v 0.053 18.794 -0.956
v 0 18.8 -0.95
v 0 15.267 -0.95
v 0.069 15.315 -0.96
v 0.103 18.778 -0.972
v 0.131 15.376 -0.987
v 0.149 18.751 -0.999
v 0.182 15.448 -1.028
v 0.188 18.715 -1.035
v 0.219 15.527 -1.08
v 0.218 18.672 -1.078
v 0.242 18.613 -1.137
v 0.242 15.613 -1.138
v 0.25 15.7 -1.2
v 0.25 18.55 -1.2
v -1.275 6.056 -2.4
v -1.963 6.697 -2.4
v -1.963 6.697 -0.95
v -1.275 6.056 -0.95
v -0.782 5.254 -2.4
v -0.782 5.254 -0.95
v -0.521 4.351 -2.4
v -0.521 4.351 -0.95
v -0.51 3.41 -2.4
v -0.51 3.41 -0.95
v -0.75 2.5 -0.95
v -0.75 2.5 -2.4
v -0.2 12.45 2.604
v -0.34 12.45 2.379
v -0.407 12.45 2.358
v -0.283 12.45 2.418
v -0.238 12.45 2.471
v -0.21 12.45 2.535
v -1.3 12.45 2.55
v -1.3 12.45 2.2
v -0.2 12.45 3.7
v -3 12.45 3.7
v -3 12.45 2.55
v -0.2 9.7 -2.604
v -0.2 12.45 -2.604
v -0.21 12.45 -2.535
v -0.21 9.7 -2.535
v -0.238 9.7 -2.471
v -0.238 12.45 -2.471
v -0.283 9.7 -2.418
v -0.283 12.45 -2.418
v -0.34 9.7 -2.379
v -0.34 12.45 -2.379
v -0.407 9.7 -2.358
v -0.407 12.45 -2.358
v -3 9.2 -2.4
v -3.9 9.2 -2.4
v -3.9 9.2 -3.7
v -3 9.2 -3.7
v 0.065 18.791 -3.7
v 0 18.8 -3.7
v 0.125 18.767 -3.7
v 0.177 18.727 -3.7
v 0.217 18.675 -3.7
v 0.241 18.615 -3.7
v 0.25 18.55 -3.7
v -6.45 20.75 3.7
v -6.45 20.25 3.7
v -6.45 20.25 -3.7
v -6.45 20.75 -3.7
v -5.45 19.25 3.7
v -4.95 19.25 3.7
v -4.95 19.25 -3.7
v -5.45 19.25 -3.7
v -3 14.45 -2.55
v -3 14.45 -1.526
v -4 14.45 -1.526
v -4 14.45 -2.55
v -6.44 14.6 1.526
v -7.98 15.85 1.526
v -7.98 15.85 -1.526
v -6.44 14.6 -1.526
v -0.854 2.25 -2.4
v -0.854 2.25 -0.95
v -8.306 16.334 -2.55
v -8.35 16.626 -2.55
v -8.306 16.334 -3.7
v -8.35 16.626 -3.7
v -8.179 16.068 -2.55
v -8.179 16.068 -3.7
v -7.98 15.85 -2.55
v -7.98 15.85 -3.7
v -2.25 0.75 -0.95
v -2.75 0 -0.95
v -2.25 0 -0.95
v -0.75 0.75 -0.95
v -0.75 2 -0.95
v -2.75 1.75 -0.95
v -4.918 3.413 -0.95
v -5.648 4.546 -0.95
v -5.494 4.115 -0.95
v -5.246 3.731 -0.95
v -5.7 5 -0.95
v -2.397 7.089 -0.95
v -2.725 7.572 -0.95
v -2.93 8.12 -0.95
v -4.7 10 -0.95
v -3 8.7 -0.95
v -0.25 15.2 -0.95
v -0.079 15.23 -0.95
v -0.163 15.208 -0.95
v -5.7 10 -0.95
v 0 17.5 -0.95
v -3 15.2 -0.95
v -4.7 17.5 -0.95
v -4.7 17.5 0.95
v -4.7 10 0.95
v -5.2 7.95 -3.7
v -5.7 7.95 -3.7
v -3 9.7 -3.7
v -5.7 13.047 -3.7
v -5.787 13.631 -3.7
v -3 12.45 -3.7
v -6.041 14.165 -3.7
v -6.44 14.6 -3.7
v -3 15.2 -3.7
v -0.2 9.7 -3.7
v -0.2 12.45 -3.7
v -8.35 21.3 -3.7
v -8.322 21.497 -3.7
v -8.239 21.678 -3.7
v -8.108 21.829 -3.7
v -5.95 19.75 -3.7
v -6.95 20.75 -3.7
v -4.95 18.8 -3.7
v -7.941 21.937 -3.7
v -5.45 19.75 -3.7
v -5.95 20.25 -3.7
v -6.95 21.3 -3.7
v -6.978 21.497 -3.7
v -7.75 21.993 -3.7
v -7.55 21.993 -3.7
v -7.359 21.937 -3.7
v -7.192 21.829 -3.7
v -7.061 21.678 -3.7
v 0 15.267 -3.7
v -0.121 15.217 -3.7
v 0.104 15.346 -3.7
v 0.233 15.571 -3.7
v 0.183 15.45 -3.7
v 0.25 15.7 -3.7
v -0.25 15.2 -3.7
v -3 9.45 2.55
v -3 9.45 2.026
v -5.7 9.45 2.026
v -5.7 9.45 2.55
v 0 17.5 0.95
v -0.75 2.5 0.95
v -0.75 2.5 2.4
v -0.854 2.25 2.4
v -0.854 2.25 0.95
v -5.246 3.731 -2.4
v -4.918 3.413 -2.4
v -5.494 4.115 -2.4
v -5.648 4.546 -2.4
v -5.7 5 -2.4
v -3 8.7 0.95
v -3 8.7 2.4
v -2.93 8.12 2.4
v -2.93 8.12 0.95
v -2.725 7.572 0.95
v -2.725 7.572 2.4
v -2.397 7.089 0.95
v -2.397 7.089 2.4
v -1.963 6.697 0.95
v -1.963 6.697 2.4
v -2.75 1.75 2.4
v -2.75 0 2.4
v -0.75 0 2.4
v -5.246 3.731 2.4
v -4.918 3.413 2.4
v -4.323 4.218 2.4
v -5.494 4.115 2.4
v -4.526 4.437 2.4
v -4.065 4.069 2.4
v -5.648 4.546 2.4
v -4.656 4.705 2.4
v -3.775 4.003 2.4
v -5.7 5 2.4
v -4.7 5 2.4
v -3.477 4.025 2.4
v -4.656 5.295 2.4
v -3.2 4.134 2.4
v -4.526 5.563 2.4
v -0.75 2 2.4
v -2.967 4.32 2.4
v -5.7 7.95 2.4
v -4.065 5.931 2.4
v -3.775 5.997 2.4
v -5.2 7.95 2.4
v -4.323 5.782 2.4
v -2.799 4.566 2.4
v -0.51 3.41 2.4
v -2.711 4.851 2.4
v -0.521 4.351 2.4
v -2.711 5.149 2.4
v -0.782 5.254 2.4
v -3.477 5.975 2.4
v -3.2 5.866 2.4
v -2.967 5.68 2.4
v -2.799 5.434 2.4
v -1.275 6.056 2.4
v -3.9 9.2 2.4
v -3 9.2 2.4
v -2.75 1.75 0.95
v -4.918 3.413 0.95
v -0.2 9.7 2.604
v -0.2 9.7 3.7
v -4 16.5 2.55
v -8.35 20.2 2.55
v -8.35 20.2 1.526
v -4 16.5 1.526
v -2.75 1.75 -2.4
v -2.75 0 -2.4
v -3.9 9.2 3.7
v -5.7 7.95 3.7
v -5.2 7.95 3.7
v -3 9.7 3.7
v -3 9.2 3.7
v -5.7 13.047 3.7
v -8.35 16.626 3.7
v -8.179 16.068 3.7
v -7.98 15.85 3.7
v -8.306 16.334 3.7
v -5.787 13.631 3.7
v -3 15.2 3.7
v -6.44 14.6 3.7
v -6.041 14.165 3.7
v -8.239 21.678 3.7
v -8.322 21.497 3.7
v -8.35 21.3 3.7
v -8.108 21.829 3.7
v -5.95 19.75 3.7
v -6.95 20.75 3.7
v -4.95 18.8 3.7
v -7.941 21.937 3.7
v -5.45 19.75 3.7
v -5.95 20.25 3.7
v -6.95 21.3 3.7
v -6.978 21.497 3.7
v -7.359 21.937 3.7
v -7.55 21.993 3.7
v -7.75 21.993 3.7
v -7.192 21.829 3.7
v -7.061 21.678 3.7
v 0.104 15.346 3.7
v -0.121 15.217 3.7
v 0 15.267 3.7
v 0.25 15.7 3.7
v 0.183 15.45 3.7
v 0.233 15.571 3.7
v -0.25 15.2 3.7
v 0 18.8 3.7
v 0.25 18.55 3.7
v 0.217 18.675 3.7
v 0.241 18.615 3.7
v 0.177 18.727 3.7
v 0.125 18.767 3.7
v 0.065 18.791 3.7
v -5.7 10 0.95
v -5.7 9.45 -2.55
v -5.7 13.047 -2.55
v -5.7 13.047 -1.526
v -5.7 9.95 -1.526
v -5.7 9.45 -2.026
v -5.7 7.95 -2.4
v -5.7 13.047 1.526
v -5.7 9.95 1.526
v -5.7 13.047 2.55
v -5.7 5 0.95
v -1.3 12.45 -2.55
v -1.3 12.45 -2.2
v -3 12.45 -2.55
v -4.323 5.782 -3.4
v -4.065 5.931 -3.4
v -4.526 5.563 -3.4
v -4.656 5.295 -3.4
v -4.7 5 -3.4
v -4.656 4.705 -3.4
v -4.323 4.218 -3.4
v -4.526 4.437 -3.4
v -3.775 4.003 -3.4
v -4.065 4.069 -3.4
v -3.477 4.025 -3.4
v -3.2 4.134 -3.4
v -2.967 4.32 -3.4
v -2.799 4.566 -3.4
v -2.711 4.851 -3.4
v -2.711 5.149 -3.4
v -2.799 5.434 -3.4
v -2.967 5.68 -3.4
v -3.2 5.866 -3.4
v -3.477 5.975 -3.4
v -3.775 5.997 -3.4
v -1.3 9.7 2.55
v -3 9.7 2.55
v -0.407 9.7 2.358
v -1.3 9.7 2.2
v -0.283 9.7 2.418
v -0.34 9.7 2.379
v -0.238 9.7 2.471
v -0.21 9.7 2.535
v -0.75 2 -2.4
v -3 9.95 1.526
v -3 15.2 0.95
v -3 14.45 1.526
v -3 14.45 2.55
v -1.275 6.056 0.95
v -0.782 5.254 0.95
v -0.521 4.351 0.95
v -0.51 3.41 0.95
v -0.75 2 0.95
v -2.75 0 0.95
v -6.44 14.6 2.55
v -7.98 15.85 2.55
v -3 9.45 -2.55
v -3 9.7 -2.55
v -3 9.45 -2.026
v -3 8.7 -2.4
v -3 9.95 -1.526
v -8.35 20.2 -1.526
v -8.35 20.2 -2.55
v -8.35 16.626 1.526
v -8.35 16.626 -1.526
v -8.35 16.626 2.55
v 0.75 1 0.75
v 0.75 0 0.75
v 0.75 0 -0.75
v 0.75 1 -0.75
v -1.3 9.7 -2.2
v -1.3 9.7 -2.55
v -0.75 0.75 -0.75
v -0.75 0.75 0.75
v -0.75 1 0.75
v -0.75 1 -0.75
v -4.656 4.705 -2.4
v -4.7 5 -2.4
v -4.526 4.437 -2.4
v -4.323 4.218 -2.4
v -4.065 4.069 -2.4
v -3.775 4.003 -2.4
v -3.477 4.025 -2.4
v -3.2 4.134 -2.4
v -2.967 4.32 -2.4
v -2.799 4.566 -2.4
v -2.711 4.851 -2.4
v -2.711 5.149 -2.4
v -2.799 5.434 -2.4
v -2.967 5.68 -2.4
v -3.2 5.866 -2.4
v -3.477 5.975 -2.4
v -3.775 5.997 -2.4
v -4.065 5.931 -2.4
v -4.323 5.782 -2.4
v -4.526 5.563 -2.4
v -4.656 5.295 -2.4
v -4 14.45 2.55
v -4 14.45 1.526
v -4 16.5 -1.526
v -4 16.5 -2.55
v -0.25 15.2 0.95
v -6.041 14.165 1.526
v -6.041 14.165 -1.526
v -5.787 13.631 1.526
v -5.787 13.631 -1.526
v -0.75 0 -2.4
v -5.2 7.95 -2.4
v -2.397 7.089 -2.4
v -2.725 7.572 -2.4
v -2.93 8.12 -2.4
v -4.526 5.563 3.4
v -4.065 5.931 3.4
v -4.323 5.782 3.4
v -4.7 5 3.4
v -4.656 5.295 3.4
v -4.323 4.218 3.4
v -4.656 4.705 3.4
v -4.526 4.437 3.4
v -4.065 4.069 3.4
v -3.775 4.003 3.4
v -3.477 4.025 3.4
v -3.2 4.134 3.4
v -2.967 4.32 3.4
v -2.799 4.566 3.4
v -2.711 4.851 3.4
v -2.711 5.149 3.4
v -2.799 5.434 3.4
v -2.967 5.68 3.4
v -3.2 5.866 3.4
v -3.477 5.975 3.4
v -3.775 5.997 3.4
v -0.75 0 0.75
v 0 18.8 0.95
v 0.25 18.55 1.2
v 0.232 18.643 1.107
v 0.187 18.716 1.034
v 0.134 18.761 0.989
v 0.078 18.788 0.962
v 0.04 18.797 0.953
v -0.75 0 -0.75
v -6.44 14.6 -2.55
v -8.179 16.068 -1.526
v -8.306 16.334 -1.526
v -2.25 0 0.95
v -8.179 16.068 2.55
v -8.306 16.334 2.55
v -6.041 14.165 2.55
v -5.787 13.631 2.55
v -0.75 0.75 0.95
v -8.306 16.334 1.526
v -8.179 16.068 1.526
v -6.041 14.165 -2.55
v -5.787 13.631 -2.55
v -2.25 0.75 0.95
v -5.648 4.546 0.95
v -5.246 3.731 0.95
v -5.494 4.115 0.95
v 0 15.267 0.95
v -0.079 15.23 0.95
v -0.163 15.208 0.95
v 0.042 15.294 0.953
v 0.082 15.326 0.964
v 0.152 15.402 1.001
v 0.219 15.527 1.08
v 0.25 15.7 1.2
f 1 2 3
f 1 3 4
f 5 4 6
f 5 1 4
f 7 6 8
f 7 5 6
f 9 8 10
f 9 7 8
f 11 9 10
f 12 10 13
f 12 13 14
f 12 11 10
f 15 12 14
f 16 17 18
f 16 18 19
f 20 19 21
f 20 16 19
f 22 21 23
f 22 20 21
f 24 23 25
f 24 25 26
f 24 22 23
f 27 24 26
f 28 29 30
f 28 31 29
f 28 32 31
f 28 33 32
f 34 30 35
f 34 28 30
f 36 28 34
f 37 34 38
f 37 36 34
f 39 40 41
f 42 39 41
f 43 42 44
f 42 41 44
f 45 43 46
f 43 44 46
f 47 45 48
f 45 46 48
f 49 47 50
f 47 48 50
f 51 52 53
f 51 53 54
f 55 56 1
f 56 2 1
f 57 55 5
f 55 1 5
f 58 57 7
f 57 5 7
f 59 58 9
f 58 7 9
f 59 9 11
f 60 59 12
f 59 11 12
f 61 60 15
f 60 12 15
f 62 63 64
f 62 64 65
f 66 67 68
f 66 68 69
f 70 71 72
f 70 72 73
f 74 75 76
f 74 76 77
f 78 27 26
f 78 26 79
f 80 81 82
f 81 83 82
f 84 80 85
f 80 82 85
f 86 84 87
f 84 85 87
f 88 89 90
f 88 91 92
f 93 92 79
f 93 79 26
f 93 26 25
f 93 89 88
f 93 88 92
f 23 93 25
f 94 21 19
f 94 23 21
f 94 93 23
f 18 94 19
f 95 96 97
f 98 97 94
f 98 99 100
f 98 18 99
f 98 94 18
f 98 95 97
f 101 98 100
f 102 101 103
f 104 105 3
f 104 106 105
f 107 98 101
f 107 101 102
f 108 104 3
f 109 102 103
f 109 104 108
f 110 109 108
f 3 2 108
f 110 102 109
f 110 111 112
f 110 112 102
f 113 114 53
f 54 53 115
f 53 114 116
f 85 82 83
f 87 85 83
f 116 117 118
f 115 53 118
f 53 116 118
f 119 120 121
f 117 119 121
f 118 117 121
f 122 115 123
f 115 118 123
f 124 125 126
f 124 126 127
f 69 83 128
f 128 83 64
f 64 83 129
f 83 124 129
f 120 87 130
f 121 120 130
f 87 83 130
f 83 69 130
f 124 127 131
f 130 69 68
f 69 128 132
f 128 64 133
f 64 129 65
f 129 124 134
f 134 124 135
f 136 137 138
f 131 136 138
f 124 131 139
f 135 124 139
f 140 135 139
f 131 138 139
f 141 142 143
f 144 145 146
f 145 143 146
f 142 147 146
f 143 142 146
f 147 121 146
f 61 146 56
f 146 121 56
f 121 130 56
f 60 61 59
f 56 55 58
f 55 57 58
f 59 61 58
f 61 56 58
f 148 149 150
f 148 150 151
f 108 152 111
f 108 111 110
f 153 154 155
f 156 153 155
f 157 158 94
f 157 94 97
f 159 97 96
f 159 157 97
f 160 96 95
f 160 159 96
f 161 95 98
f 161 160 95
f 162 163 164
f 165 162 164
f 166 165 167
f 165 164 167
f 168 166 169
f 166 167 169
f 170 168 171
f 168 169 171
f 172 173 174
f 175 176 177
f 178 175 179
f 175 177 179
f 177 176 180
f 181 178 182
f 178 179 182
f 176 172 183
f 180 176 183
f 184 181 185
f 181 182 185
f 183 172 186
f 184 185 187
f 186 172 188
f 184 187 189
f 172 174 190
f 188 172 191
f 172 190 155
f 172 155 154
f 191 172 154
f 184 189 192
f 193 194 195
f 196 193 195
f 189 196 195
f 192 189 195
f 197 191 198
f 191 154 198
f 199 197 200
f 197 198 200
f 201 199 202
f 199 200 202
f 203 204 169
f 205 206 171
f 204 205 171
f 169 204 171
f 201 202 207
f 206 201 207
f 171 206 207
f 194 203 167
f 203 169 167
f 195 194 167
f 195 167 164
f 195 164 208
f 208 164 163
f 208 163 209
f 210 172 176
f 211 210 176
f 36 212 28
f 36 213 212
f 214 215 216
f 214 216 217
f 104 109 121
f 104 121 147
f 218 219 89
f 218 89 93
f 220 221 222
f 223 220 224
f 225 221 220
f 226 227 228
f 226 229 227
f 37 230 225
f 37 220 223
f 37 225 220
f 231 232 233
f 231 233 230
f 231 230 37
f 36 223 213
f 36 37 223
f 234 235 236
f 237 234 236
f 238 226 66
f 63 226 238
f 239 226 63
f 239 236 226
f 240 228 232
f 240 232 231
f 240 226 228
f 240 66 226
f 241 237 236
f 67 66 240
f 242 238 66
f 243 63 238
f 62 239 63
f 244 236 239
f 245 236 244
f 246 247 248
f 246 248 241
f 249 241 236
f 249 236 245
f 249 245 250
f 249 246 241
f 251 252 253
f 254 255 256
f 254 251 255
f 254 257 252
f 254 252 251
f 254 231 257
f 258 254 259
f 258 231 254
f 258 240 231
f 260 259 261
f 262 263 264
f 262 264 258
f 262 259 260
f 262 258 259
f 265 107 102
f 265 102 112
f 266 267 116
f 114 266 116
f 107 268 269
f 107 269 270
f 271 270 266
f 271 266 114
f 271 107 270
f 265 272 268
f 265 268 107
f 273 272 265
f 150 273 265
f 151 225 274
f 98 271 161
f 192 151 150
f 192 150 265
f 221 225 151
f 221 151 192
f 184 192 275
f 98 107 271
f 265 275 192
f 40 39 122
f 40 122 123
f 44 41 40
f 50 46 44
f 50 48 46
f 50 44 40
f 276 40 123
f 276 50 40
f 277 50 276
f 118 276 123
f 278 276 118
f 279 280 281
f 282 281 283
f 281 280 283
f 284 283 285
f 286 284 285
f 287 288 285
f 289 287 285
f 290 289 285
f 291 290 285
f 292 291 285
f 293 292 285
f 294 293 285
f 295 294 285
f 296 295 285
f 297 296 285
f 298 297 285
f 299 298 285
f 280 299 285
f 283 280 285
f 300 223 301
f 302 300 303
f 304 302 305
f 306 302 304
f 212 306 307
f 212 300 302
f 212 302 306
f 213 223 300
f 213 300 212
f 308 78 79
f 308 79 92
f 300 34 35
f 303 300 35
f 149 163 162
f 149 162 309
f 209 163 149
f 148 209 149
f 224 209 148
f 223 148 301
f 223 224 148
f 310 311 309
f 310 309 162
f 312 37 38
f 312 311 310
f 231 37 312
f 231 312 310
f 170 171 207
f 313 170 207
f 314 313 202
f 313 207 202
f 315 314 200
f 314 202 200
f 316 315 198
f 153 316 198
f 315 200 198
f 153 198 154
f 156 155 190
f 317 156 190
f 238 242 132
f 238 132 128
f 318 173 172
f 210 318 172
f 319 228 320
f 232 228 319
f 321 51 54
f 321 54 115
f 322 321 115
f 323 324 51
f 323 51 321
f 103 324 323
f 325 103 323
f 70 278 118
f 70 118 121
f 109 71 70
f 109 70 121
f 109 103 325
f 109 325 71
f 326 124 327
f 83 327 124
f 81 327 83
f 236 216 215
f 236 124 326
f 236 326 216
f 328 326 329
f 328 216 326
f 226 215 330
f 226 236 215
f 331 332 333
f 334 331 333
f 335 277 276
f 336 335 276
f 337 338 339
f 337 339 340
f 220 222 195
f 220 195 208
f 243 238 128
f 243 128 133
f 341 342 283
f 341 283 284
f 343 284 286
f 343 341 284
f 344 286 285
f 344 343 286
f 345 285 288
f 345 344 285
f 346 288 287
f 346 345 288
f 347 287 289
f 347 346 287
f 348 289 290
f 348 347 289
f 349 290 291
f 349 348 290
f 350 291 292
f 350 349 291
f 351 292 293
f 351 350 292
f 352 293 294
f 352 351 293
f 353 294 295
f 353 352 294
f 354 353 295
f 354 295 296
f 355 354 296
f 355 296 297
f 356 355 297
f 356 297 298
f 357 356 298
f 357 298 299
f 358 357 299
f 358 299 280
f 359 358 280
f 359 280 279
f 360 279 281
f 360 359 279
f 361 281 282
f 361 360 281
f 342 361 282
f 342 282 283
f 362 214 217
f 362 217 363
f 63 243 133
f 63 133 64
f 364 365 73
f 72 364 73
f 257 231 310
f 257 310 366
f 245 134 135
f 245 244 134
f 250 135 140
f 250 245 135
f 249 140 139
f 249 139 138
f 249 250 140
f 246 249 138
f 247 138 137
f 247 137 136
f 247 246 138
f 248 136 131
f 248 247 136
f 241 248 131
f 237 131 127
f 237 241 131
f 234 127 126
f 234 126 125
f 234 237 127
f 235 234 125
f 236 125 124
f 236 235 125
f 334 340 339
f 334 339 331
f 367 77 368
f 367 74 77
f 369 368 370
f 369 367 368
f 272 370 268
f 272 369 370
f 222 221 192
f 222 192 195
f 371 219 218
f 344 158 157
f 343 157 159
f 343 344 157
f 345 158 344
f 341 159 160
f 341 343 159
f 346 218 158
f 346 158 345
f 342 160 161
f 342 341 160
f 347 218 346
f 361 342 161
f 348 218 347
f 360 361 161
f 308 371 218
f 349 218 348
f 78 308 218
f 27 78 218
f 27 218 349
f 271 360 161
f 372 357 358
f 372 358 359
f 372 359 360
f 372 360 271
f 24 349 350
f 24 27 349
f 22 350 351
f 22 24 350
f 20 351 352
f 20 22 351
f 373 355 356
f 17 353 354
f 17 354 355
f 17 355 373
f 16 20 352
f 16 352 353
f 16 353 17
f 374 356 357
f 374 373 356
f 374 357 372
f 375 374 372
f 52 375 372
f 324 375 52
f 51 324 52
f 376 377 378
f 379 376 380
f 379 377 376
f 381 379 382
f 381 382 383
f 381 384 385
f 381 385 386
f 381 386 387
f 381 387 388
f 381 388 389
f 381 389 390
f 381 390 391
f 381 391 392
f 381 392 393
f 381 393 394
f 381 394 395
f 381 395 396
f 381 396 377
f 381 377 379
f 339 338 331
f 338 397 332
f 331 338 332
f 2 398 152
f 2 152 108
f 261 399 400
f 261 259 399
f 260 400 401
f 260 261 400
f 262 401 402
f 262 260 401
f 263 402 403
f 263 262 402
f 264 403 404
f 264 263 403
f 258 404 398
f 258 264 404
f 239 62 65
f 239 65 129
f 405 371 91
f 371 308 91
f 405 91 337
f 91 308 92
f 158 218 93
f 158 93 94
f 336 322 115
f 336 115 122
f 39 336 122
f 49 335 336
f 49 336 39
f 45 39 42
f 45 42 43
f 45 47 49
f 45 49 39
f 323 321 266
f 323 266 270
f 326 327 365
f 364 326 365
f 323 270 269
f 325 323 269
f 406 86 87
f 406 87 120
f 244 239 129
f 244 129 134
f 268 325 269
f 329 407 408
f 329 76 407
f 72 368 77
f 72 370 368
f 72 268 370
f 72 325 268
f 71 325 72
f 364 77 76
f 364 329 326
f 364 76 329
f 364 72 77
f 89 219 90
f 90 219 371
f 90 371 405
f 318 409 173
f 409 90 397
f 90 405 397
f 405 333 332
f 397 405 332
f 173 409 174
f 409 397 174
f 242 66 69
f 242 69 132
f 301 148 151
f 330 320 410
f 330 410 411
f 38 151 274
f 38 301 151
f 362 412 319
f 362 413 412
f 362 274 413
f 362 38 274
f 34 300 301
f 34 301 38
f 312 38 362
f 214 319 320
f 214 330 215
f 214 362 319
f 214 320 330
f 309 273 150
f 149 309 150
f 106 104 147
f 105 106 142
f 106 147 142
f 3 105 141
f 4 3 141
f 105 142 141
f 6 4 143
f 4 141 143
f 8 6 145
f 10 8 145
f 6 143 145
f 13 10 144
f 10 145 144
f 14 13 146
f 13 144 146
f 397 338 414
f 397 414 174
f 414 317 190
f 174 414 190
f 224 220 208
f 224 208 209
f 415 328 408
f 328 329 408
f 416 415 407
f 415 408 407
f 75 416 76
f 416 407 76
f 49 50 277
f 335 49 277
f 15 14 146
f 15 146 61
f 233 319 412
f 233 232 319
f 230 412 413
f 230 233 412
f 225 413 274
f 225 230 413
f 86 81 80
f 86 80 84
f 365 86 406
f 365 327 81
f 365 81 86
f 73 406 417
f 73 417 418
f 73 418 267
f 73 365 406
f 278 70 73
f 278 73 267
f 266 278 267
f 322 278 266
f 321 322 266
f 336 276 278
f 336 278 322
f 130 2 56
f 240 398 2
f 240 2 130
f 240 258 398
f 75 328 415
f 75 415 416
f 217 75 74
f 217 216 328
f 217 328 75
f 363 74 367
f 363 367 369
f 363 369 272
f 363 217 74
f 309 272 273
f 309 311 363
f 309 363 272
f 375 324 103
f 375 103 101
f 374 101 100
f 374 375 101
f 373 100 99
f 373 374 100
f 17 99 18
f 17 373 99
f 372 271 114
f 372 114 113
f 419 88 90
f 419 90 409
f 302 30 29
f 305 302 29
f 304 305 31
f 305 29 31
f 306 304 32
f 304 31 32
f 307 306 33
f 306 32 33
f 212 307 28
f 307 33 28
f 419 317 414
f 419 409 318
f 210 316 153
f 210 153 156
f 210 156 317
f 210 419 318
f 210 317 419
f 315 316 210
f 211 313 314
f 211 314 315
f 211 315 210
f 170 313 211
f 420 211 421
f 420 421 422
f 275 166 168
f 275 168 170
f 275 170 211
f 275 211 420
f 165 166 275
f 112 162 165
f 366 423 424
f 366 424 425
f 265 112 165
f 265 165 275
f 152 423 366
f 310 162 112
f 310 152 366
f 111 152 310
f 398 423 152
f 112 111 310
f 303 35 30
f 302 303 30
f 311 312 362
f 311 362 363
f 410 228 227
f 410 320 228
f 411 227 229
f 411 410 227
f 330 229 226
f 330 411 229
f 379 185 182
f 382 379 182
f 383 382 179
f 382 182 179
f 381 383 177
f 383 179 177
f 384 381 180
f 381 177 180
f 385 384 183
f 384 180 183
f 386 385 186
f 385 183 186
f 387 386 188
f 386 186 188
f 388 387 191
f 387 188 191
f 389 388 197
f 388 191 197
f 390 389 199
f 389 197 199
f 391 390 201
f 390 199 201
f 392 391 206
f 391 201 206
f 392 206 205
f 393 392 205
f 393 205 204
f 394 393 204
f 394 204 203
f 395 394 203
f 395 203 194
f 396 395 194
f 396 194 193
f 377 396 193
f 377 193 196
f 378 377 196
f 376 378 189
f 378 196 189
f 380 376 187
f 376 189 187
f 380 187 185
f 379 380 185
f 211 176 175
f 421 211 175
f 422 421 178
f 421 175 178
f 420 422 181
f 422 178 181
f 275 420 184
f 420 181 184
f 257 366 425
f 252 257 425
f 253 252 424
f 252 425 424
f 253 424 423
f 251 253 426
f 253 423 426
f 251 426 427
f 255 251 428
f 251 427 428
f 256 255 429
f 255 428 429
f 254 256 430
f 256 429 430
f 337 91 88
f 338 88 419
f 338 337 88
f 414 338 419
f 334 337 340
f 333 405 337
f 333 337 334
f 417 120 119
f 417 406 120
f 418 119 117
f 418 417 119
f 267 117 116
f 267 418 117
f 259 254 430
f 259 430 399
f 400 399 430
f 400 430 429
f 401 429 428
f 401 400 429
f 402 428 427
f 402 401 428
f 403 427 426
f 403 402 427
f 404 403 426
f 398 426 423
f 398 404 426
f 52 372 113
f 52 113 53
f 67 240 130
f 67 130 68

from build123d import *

# Parameters (mm, degrees)
SKETCH1_W                 = 1.5
SKETCH1_H                 = 1.5
BASE_BLOCK_DEPTH          = 1
SKETCH2_W                 = 4.8
SKETCH2_H                 = 0.75
BASE_BRIDGE_DEPTH         = 1.5
LOWER_SIDE_1_DEPTH        = 1.45
SKETCH6_R                 = 1
PIVOT_DEPTH               = 1
BODY_BLOCK_DEPTH          = 3.7
SKETCH8_W                 = 1.9
SKETCH8_H                 = 8.25
REAR_CUT_THROUGH_DEPTH    = 24.222672112
CLIP_FORMING_DEPTH        = 2.75
THROUGH_HOLES_DEPTH       = 23.941501695
SKETCH11_W                = 1.9
SKETCH11_H                = 7.5
PCB_SLOT_DEPTH            = 4.95
THROUGH_HOLE_REAR_1_DEPTH = 1.023508356
THROUGH_HOLE_REAR_2_DEPTH = 1.023508356
SKETCH15_W                = 1.9
SKETCH15_H                = 1.3
PCB_SLOT_TOP_DEPTH        = 0.25
REAR_FILLET_2MM_R         = 2
REAR_FILLET_1MM_R         = 1
GUIDE_FILLET_0_25MM_R     = 0.25
GUIDE_FILLET_0_5MM_R      = 0.5


# Some blends are built 0.0001 mm under size
with BuildPart() as part:
    # Sketch1 → Base Block (new body)
    with BuildSketch(Plane(origin=(0, 0, 0), x_dir=(1, 0, 0), z_dir=(0, 1, 0))):
        Rectangle(SKETCH1_W, SKETCH1_H)
    extrude(amount=BASE_BLOCK_DEPTH)

    # Sketch2 → Base Bridge (add)
    with BuildSketch(Plane.ZY.offset(0.75)):
        with Locations((0, 0.375)):
            Rectangle(SKETCH2_W, SKETCH2_H)
    extrude(amount=BASE_BRIDGE_DEPTH)

    # Sketch5 → Lower Side 1 (add)
    with BuildSketch(Plane.XY.offset(2.4)):
        with BuildLine():
            Line((-0.75, 0), (-2.75, 0))
            Line((-2.75, 0), (-2.75, 1.75))
            Line((-2.75, 1.75), (-4.917566413, 3.413326741))
            ThreePointArc((-4.917566413, 3.413326741), (-5.493757624, 4.115447239), (-5.7, 5))
            Line((-5.7, 5), (-5.7, 14))
            Line((-5.7, 14), (-8.35, 16.15))
            Line((-8.35, 16.15), (-8.35, 21.3))
            ThreePointArc((-8.35, 21.3), (-7.65, 22), (-6.95, 21.3))
            Line((-6.95, 21.3), (-6.95, 18.8))
            Line((-6.95, 18.8), (0.25, 18.8))
            Line((0.25, 18.8), (0.25, 15.2))
            Line((0.25, 15.2), (-3, 15.2))
            Line((-3, 15.2), (-3, 12.45))
            Line((-3, 12.45), (-0.2, 12.45))
            Line((-0.2, 12.45), (-0.2, 9.7))
            Line((-0.2, 9.7), (-3, 9.7))
            Line((-3, 9.7), (-3, 8.7))
            ThreePointArc((-3, 8.7), (-2.725432986, 7.572457553), (-1.963210212, 6.697383009))
            ThreePointArc((-1.963210212, 6.697383009), (-0.621213938, 4.811248727), (-0.75, 2.5))
            Line((-0.75, 2.5), (-0.853553391, 2.25))
            Line((-0.853553391, 2.25), (-0.75, 2))
            Line((-0.75, 2), (-0.75, 0))
        make_face()
    lower_side_1 = extrude(amount=-LOWER_SIDE_1_DEPTH)

    # Sketch6 → Pivot (add)
    with BuildSketch(Plane.XY.offset(2.4)):
        with Locations(Location((-3.7, 5, 0), (0, 0, 180))):
            Circle(SKETCH6_R)
    pivot = extrude(amount=PIVOT_DEPTH)

    # Lower Side 2: Lower Side 1, Pivot across plane
    add(lower_side_1.mirror(Plane.XY))
    add(pivot.mirror(Plane.XY))

    # Sketch7 → Body Block (add, symmetric)
    with BuildSketch(Plane.XY):
        with BuildLine():
            Line((-8.35, 16.15), (-5.7, 14))
            Line((-5.7, 14), (-5.7, 7.95))
            Line((-5.7, 7.95), (-5.2, 7.95))
            Line((-5.2, 7.95), (-3.9, 9.2))
            Line((-3.9, 9.2), (-3, 9.2))
            Line((-3, 9.2), (-3, 9.7))
            Line((-3, 9.7), (-0.2, 9.7))
            Line((-0.2, 9.7), (-0.2, 12.45))
            Line((-0.2, 12.45), (-3, 12.45))
            Line((-3, 12.45), (-3, 15.2))
            Line((-3, 15.2), (0.25, 15.2))
            Line((0.25, 15.2), (0.25, 18.8))
            Line((0.25, 18.8), (-4.95, 18.8))
            Line((-4.95, 18.8), (-4.95, 19.25))
            Line((-4.95, 19.25), (-5.45, 19.25))
            Line((-5.45, 19.25), (-5.45, 19.75))
            Line((-5.45, 19.75), (-5.95, 19.75))
            Line((-5.95, 19.75), (-5.95, 20.25))
            Line((-5.95, 20.25), (-6.45, 20.25))
            Line((-6.45, 20.25), (-6.45, 20.75))
            Line((-6.45, 20.75), (-6.95, 20.75))
            Line((-6.95, 20.75), (-6.95, 21.3))
            ThreePointArc((-6.95, 21.3), (-7.65, 22), (-8.35, 21.3))
            Line((-8.35, 21.3), (-8.35, 16.15))
        make_face()
    extrude(amount=BODY_BLOCK_DEPTH, both=True)

    # Sketch8 → Rear Cut Through (cut, through all)
    with BuildSketch(Plane.ZY.offset(5.7)):
        with Locations((0, 5.875)):
            Rectangle(SKETCH8_W, SKETCH8_H)
    extrude(amount=-REAR_CUT_THROUGH_DEPTH, mode=Mode.SUBTRACT)

    # Sketch9 → Clip Forming (cut)
    with BuildSketch(Plane(origin=(0, 12.45, 0), x_dir=(1, 0, 0), z_dir=(0, 1, 0))):
        with BuildLine():
            Line((-1.3, -2.2), (-0.406587956, -2.357532648))
            ThreePointArc((-0.406587956, -2.357532648), (-0.258488889, -2.443037684), (-0.2, -2.603734587))
            Line((-0.2, -2.603734587), (-0.2, 2.603734587))
            ThreePointArc((-0.2, 2.603734587), (-0.258488889, 2.443037684), (-0.406587956, 2.357532648))
            Line((-0.406587956, 2.357532648), (-1.3, 2.2))
            Line((-1.3, 2.2), (-1.3, 2.55))
            Line((-1.3, 2.55), (-3, 2.55))
            Line((-3, 2.55), (-3, -2.55))
            Line((-3, -2.55), (-1.3, -2.55))
            Line((-1.3, -2.55), (-1.3, -2.2))
        make_face()
    extrude(amount=-CLIP_FORMING_DEPTH, mode=Mode.SUBTRACT)

    # Sketch10 → Through Holes (cut, through all)
    with BuildSketch(Plane(origin=(-3, 0, 0), x_dir=(0, 0, -1), z_dir=(1, 0, 0))):
        Polygon((-2.55, 14.45), (-1.526491644, 14.45), (-1.526491644, 9.95), (-2.026491644, 9.45), (-2.55, 9.45), align=None)
        Polygon((2.55, 14.45), (2.55, 9.45), (2.026491644, 9.45), (1.526491644, 9.95), (1.526491644, 14.45), align=None)
    extrude(amount=-THROUGH_HOLES_DEPTH, mode=Mode.SUBTRACT)

    # Sketch11 → PCB Slot (cut)
    with BuildSketch(Plane(origin=(0.25, 0, 0), x_dir=(0, 0, -1), z_dir=(1, 0, 0))):
        with Locations((0, 13.75)):
            Rectangle(SKETCH11_W, SKETCH11_H)
    extrude(amount=-PCB_SLOT_DEPTH, mode=Mode.SUBTRACT)

    # Sketch13 → Through Hole Rear 1 (cut)
    with BuildSketch(Plane.XY.offset(-2.55)):
        Polygon((-8.35, 20.2), (-4, 16.5), (-4, 14.45), (-6.254651163, 14.45), (-8.35, 16.15), align=None)
    extrude(amount=THROUGH_HOLE_REAR_1_DEPTH, mode=Mode.SUBTRACT)

    # Sketch14 → Through Hole Rear 2 (cut)
    with BuildSketch(Plane(origin=(0, 0, 2.55), x_dir=(-1, 0, 0), z_dir=(0, 0, -1))):
        Polygon((8.35, 20.2), (4, 16.5), (4, 14.45), (6.254651163, 14.45), (8.35, 16.15), align=None)
    extrude(amount=THROUGH_HOLE_REAR_2_DEPTH, mode=Mode.SUBTRACT)

    # Sketch15 → PCB Slot Top (cut)
    with BuildSketch(Plane(origin=(0.25, 0, 0), x_dir=(0, 0, -1), z_dir=(1, 0, 0))):
        with Locations((0, 18.15)):
            Rectangle(SKETCH15_W, SKETCH15_H)
    extrude(amount=-PCB_SLOT_TOP_DEPTH, mode=Mode.SUBTRACT)

    # Rear Fillet (2mm)
    rear_fillet_2mm_edges = [part.edges().sort_by_distance(p)[0] for p in [
        (-5.7, 14, 3.125),
        (-5.7, 14, 0),
        (-5.7, 14, -3.125),
    ]]
    fillet(rear_fillet_2mm_edges, radius=REAR_FILLET_2MM_R)

    # Rear Fillet (1mm)
    rear_fillet_1mm_edges = [part.edges().sort_by_distance(p)[0] for p in [
        (-8.35, 16.15, 0),
        (-8.35, 16.15, -3.125),
        (-8.35, 16.15, 3.125),
    ]]
    fillet(rear_fillet_1mm_edges, radius=REAR_FILLET_1MM_R)

    # Guide Fillet (0.25mm)
    guide_fillet_0_25mm_edges = [part.edges().sort_by_distance(p)[0] for p in [
        (0.25, 17, -0.95),
        (0.25, 17, 0.95),
        (0.25, 18.8, -2.325),
        (0.25, 18.8, 2.325),
    ]]
    fillet(guide_fillet_0_25mm_edges, radius=GUIDE_FILLET_0_25MM_R - 0.0001)  # a hair under: the kernel refuses the full size

    # Guide Fillet (0.5mm)
    # the kernel refuses this fillet: 0.5 mm, written as the material it takes off along each edge
    with BuildSketch(Plane(origin=(0.25, 15.2, -4.95), x_dir=(-1, 0, 0), z_dir=(0, 0, 1))) as guide_fillet_0_5mm_piece_1:
        with BuildLine():
            CenterArc((GUIDE_FILLET_0_5MM_R, -GUIDE_FILLET_0_5MM_R), GUIDE_FILLET_0_5MM_R, 90, 90)
            Line((0, -GUIDE_FILLET_0_5MM_R), (0, 0))
            Line((0, 0), (GUIDE_FILLET_0_5MM_R, 0))
        make_face()
    extrude(amount=5.0001, mode=Mode.SUBTRACT)
    with BuildSketch(Plane(origin=(0.25, 15.2, -0.0501), x_dir=(0, 1, 0), z_dir=(0, 0, 1))) as guide_fillet_0_5mm_piece_2:
        with BuildLine():
            CenterArc((GUIDE_FILLET_0_5MM_R, GUIDE_FILLET_0_5MM_R), GUIDE_FILLET_0_5MM_R, 180, 90)
            Line((0, GUIDE_FILLET_0_5MM_R), (0, 0))
            Line((0, 0), (GUIDE_FILLET_0_5MM_R, 0))
        make_face()
    extrude(amount=5.0001, mode=Mode.SUBTRACT)


solid = part.part
